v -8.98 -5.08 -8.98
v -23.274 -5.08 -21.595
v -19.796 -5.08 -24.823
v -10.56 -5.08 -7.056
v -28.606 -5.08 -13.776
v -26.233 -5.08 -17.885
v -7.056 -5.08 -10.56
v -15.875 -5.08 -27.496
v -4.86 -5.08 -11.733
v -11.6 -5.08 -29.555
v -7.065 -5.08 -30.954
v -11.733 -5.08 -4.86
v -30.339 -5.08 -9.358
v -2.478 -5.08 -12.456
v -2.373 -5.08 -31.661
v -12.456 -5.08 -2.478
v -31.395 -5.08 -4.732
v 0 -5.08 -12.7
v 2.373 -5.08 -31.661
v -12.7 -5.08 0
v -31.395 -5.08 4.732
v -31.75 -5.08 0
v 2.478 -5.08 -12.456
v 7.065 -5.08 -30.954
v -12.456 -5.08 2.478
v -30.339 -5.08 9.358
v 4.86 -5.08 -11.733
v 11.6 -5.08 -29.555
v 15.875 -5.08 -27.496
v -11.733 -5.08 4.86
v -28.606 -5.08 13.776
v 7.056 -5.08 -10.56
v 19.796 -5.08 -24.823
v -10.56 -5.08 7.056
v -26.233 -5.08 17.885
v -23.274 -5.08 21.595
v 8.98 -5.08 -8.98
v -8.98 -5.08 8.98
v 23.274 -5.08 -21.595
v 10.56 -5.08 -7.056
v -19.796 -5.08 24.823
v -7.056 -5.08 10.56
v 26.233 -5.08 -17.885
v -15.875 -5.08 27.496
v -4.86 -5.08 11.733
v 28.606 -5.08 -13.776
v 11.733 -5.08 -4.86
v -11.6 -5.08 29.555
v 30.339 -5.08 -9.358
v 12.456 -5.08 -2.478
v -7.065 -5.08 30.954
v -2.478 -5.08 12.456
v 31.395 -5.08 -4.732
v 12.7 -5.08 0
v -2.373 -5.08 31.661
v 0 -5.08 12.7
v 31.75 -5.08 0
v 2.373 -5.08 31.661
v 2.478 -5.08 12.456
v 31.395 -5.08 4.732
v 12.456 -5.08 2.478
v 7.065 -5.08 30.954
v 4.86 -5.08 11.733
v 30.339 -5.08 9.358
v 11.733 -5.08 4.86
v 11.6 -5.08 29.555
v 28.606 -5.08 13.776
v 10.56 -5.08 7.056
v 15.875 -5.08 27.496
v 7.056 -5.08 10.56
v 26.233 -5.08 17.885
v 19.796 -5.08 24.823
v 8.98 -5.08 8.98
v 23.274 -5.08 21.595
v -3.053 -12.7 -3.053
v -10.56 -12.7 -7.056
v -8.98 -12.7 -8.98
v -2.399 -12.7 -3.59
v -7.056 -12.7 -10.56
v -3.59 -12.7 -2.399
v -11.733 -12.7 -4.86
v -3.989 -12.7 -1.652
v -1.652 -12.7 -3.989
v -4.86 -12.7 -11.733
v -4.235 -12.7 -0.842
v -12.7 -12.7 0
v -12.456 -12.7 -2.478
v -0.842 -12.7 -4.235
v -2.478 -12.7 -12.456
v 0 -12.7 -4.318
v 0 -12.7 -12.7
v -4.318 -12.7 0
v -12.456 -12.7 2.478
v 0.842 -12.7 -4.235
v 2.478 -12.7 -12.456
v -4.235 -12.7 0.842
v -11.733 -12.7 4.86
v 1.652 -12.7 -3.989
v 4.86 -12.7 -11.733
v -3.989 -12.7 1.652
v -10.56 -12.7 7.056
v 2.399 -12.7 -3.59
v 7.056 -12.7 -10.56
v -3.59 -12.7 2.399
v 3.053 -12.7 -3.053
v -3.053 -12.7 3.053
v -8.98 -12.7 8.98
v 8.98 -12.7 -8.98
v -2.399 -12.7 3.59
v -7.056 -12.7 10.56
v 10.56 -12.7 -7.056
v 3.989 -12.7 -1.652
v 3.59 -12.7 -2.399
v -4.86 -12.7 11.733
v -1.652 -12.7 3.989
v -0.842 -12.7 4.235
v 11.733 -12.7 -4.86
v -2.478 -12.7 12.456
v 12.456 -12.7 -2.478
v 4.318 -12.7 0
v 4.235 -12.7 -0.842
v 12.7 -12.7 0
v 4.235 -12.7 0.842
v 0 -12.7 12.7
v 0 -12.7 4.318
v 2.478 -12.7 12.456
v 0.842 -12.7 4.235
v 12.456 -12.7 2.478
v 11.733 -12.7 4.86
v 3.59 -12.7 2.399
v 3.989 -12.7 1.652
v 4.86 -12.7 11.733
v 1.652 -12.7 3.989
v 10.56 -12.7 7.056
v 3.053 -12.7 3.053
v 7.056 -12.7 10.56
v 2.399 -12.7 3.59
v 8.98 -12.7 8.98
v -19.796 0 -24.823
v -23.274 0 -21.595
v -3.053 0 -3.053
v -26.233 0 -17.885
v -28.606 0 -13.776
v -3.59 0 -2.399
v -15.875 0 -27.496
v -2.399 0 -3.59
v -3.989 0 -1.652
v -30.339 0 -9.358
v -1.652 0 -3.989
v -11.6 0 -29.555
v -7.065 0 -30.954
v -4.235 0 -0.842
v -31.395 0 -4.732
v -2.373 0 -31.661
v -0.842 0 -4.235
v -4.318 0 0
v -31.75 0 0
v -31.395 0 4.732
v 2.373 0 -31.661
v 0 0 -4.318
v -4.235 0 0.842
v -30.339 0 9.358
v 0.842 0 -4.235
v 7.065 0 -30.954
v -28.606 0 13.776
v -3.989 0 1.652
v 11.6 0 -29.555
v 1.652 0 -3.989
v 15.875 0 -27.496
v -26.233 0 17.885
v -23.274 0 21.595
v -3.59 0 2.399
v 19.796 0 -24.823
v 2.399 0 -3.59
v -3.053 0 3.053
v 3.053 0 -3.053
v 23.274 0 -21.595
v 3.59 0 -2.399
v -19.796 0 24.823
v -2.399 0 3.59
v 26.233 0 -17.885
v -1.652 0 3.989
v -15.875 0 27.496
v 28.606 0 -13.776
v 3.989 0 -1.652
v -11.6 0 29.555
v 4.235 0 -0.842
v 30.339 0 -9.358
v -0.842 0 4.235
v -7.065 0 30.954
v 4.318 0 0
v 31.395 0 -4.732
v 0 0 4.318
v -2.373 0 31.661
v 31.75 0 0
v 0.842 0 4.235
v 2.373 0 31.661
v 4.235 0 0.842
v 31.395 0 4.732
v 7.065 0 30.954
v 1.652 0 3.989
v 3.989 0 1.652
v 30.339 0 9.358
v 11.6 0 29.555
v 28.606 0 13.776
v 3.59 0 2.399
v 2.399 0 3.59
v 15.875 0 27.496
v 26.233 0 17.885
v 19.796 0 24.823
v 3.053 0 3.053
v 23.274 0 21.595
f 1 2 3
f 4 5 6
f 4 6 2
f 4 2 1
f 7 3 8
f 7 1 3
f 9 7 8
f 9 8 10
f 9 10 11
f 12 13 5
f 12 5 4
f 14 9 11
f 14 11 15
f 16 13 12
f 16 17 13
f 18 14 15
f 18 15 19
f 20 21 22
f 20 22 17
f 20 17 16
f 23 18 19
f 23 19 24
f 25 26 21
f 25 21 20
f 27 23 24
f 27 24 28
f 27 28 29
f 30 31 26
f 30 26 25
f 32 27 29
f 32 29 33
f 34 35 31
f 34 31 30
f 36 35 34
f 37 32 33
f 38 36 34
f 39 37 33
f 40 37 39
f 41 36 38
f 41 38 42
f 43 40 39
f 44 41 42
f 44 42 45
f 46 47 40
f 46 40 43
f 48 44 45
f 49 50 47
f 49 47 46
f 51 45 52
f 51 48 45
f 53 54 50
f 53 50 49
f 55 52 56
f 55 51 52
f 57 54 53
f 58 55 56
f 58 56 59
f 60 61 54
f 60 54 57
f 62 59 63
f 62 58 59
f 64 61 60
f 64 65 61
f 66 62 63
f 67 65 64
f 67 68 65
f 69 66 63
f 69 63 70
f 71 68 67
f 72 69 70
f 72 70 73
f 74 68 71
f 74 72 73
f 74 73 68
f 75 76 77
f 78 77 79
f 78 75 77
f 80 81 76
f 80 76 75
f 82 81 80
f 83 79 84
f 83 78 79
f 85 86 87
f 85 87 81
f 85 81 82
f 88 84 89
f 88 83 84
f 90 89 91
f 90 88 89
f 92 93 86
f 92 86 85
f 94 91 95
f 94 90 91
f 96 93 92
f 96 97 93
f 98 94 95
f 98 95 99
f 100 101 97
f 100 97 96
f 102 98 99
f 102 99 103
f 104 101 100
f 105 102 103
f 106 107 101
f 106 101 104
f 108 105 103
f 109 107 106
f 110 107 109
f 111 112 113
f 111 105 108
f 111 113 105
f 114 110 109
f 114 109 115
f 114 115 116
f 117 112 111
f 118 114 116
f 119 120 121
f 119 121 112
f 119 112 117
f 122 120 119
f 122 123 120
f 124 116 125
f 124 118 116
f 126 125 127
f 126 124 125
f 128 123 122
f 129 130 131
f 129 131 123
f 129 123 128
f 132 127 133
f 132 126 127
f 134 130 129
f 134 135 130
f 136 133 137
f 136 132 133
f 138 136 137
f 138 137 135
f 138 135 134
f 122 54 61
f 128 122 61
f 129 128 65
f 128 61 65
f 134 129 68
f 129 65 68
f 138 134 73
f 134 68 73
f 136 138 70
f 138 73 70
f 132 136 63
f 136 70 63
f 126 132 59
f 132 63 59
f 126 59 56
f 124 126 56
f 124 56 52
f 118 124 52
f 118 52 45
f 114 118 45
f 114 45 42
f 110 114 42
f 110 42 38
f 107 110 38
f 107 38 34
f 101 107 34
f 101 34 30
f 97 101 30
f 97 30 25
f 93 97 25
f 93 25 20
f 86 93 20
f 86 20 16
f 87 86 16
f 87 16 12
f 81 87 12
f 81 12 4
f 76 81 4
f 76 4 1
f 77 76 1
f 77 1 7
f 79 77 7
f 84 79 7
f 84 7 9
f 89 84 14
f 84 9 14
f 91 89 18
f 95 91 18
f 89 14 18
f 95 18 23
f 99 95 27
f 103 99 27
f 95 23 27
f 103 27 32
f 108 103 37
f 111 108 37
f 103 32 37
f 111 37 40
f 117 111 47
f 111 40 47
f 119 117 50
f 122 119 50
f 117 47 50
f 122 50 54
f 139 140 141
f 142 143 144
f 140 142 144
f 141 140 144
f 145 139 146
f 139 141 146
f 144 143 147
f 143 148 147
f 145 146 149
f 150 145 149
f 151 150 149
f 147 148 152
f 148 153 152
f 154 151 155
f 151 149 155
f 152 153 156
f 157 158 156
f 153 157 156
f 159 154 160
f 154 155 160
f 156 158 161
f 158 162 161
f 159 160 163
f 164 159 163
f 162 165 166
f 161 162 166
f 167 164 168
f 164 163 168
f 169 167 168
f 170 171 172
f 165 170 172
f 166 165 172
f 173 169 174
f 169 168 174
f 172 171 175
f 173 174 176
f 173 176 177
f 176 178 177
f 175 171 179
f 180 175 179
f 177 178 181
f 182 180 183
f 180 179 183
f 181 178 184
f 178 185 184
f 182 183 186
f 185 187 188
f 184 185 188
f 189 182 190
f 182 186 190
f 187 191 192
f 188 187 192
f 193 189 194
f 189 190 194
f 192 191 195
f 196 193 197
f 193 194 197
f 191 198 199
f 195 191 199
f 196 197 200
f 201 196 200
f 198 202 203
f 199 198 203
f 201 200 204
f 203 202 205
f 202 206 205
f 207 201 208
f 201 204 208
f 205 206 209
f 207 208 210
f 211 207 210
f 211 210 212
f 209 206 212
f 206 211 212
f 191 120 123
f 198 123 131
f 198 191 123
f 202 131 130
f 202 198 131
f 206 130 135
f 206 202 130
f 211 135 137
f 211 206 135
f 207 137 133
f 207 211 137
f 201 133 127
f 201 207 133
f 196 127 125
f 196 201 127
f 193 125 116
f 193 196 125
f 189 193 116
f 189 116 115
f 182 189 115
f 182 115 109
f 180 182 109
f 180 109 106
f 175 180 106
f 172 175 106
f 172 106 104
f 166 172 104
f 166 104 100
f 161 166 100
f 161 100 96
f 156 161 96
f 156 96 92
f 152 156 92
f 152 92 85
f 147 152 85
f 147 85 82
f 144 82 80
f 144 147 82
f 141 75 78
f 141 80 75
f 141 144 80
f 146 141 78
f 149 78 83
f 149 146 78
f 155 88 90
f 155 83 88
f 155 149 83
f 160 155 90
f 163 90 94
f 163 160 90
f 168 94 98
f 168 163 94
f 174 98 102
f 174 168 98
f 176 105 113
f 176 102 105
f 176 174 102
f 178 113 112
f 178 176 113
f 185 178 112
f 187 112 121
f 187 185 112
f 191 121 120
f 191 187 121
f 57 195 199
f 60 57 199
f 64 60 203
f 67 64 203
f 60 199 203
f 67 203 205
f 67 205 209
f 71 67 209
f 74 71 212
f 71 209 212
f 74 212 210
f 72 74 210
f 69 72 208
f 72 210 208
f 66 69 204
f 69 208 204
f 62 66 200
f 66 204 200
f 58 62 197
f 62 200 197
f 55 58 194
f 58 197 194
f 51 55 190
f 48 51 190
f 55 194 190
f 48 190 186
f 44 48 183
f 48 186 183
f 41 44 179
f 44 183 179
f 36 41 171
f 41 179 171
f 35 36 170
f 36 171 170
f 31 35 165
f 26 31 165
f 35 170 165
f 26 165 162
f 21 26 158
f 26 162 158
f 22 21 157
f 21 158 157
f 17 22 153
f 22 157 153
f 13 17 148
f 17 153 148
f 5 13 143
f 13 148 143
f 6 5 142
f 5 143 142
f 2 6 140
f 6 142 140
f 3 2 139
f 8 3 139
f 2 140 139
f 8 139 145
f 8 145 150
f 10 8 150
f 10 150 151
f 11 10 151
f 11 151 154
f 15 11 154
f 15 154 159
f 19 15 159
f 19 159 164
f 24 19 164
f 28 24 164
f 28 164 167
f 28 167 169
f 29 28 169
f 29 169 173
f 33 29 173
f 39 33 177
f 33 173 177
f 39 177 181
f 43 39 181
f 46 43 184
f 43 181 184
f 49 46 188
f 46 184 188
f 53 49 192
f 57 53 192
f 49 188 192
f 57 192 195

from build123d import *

# Parameters (mm, degrees)
F0_R          = 12.7
F1_DEPTH      = 12.7
F2_R          = 31.75
F3_DEPTH      = 5.08
F4_R          = 4.318
F5_DEPTH      = 12.701
F5_DEPTH_BACK = 95


# Not quite as in the source:
# - an extrude ends at something that could not be found from the text; its depth is read off the source's solid


with BuildPart() as f1:
    # F0 (on Front) → F1 (new body)
    with BuildSketch(Plane.XZ):
        Circle(F0_R)
    extrude(amount=F1_DEPTH)

    # F2 (on Front) → F3 (join)
    with BuildSketch(Plane.XZ):
        Circle(F2_R)
    extrude(amount=F3_DEPTH)

    # F4 (on Front) → F5 (cut, two sides)
    with BuildSketch(Plane.XZ) as f5_sk:
        Circle(F4_R)
    extrude(amount=F5_DEPTH, mode=Mode.SUBTRACT)
    extrude(f5_sk.sketch, amount=-F5_DEPTH_BACK, mode=Mode.SUBTRACT)


solid = f1.part
